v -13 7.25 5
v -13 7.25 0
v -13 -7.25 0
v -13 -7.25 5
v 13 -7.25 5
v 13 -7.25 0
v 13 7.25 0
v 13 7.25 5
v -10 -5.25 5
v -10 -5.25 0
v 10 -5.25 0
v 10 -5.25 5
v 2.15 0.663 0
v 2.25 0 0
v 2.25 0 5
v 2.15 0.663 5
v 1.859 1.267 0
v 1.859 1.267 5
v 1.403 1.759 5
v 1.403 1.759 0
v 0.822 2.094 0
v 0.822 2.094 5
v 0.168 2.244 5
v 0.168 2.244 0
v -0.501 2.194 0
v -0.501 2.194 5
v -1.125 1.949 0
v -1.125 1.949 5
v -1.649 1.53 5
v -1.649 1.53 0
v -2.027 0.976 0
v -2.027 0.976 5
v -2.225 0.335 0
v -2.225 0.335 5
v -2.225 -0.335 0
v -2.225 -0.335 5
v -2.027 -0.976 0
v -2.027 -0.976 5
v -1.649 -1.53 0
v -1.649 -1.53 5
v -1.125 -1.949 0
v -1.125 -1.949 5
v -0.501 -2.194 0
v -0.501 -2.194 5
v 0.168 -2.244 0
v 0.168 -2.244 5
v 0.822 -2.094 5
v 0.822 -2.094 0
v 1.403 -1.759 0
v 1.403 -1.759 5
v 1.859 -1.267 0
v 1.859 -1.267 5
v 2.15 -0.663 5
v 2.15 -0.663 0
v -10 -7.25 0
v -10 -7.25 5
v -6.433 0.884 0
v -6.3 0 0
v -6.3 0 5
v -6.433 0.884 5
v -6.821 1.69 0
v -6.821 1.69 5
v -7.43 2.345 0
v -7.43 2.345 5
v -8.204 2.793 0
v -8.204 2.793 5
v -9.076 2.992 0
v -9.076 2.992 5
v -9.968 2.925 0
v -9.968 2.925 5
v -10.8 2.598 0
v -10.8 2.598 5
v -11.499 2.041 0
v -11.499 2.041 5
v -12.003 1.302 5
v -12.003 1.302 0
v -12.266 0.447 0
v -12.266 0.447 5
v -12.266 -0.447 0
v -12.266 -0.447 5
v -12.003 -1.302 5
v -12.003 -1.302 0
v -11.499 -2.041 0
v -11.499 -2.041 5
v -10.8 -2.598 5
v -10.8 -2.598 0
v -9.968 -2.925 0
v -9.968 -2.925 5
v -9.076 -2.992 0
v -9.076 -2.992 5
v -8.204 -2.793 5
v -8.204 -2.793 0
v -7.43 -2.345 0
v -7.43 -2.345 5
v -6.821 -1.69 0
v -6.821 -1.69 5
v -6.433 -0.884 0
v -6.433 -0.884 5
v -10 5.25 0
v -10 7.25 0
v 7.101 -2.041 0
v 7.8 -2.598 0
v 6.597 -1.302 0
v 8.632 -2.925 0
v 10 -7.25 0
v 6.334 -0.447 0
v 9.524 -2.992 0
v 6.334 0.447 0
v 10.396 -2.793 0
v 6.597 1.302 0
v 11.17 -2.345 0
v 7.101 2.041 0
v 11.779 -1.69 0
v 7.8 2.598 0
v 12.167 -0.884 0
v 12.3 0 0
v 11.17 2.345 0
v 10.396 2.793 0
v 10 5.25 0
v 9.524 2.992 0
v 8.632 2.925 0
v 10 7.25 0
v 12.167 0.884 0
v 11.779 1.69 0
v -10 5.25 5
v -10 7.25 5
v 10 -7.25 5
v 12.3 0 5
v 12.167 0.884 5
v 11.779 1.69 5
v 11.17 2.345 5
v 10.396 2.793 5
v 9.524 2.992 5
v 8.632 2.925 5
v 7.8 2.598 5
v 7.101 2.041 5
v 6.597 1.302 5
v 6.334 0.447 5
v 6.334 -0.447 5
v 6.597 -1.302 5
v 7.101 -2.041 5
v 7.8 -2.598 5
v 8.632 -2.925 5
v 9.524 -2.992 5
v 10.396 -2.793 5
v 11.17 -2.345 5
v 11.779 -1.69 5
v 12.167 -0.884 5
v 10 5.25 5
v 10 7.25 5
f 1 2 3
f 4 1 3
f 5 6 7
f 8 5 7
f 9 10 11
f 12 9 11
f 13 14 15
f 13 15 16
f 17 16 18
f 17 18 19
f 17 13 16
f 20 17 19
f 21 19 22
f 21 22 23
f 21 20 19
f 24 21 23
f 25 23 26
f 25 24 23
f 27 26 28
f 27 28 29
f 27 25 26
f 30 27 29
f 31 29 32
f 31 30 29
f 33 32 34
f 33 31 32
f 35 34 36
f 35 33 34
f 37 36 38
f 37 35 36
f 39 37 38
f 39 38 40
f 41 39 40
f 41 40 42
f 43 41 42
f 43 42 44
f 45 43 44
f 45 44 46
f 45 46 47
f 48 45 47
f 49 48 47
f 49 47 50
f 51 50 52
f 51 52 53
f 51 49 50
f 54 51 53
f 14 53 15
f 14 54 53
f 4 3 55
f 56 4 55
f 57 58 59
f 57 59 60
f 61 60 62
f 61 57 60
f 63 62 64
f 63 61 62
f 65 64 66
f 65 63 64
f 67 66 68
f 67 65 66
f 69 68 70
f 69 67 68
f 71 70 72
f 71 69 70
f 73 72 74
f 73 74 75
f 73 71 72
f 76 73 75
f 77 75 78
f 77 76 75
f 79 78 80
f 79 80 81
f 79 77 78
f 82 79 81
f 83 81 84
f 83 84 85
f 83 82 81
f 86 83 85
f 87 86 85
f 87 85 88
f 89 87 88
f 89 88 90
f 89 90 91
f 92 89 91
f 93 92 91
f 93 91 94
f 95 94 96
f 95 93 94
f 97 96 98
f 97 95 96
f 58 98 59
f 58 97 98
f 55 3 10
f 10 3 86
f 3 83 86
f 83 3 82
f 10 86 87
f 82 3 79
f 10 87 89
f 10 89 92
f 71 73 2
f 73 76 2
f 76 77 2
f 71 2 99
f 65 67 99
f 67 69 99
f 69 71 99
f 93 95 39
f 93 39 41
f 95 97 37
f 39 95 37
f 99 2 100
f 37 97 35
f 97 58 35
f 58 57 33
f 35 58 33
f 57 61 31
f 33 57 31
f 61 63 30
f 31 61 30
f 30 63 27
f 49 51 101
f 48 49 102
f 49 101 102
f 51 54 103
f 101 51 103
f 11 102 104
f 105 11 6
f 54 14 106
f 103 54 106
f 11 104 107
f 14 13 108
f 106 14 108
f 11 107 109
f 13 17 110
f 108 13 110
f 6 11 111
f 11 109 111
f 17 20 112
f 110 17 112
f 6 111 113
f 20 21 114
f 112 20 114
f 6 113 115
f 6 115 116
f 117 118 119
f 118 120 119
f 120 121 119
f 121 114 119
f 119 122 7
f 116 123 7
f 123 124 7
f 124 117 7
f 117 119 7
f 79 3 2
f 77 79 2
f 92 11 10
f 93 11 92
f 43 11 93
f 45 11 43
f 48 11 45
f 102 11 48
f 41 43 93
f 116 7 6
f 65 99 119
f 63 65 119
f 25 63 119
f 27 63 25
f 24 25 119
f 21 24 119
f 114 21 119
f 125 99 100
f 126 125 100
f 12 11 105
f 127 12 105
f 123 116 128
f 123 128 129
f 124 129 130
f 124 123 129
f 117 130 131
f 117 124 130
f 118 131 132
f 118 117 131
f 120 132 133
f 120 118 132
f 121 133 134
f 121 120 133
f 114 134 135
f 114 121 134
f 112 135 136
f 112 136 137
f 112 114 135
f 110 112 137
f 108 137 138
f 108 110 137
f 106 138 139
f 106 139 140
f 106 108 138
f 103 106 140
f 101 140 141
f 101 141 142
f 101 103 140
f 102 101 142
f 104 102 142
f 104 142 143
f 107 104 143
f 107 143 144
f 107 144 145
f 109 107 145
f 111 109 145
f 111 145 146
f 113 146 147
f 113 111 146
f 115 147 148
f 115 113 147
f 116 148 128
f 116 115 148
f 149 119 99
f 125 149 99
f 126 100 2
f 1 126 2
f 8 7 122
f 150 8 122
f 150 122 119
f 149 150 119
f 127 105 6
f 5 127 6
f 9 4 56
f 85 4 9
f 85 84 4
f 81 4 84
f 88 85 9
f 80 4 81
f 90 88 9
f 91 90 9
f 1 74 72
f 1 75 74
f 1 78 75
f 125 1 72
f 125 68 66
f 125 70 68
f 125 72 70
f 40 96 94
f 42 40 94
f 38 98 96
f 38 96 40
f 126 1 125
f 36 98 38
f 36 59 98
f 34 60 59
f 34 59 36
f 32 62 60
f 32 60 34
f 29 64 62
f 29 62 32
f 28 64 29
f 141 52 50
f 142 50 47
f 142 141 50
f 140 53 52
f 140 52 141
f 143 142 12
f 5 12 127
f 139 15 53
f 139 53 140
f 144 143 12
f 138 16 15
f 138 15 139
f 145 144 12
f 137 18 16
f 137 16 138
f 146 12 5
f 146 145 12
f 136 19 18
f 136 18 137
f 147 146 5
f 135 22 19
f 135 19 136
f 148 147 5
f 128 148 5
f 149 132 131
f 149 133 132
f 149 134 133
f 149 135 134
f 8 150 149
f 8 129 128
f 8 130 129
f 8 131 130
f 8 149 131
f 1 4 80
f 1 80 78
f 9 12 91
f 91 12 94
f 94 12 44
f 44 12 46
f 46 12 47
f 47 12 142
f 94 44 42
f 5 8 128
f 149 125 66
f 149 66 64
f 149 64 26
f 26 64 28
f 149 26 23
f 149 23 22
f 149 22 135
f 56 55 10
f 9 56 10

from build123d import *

# Parameters (mm, degrees)
SKETCH1_R           = 3
SKETCH1_R_2         = 2.25
BOSS_EXTRUDE1_DEPTH = 5


with BuildPart() as part:
    # Sketch1 → Boss-Extrude1 (new body)
    with BuildSketch(Plane.XY):
        Polygon((-13, 7.25), (-13, -7.25), (-10, -7.25), (-10, -5.25), (10, -5.25), (10, -7.25), (13, -7.25), (13, 7.25), (10, 7.25), (10, 5.25), (-10, 5.25), (-10, 7.25), align=None)
        with Locations((-9.3, 0)):
            Circle(SKETCH1_R, mode=Mode.SUBTRACT)
        Circle(SKETCH1_R_2, mode=Mode.SUBTRACT)
        with Locations((9.3, 0)):
            Circle(SKETCH1_R, mode=Mode.SUBTRACT)
    extrude(amount=BOSS_EXTRUDE1_DEPTH)


solid = part.part
